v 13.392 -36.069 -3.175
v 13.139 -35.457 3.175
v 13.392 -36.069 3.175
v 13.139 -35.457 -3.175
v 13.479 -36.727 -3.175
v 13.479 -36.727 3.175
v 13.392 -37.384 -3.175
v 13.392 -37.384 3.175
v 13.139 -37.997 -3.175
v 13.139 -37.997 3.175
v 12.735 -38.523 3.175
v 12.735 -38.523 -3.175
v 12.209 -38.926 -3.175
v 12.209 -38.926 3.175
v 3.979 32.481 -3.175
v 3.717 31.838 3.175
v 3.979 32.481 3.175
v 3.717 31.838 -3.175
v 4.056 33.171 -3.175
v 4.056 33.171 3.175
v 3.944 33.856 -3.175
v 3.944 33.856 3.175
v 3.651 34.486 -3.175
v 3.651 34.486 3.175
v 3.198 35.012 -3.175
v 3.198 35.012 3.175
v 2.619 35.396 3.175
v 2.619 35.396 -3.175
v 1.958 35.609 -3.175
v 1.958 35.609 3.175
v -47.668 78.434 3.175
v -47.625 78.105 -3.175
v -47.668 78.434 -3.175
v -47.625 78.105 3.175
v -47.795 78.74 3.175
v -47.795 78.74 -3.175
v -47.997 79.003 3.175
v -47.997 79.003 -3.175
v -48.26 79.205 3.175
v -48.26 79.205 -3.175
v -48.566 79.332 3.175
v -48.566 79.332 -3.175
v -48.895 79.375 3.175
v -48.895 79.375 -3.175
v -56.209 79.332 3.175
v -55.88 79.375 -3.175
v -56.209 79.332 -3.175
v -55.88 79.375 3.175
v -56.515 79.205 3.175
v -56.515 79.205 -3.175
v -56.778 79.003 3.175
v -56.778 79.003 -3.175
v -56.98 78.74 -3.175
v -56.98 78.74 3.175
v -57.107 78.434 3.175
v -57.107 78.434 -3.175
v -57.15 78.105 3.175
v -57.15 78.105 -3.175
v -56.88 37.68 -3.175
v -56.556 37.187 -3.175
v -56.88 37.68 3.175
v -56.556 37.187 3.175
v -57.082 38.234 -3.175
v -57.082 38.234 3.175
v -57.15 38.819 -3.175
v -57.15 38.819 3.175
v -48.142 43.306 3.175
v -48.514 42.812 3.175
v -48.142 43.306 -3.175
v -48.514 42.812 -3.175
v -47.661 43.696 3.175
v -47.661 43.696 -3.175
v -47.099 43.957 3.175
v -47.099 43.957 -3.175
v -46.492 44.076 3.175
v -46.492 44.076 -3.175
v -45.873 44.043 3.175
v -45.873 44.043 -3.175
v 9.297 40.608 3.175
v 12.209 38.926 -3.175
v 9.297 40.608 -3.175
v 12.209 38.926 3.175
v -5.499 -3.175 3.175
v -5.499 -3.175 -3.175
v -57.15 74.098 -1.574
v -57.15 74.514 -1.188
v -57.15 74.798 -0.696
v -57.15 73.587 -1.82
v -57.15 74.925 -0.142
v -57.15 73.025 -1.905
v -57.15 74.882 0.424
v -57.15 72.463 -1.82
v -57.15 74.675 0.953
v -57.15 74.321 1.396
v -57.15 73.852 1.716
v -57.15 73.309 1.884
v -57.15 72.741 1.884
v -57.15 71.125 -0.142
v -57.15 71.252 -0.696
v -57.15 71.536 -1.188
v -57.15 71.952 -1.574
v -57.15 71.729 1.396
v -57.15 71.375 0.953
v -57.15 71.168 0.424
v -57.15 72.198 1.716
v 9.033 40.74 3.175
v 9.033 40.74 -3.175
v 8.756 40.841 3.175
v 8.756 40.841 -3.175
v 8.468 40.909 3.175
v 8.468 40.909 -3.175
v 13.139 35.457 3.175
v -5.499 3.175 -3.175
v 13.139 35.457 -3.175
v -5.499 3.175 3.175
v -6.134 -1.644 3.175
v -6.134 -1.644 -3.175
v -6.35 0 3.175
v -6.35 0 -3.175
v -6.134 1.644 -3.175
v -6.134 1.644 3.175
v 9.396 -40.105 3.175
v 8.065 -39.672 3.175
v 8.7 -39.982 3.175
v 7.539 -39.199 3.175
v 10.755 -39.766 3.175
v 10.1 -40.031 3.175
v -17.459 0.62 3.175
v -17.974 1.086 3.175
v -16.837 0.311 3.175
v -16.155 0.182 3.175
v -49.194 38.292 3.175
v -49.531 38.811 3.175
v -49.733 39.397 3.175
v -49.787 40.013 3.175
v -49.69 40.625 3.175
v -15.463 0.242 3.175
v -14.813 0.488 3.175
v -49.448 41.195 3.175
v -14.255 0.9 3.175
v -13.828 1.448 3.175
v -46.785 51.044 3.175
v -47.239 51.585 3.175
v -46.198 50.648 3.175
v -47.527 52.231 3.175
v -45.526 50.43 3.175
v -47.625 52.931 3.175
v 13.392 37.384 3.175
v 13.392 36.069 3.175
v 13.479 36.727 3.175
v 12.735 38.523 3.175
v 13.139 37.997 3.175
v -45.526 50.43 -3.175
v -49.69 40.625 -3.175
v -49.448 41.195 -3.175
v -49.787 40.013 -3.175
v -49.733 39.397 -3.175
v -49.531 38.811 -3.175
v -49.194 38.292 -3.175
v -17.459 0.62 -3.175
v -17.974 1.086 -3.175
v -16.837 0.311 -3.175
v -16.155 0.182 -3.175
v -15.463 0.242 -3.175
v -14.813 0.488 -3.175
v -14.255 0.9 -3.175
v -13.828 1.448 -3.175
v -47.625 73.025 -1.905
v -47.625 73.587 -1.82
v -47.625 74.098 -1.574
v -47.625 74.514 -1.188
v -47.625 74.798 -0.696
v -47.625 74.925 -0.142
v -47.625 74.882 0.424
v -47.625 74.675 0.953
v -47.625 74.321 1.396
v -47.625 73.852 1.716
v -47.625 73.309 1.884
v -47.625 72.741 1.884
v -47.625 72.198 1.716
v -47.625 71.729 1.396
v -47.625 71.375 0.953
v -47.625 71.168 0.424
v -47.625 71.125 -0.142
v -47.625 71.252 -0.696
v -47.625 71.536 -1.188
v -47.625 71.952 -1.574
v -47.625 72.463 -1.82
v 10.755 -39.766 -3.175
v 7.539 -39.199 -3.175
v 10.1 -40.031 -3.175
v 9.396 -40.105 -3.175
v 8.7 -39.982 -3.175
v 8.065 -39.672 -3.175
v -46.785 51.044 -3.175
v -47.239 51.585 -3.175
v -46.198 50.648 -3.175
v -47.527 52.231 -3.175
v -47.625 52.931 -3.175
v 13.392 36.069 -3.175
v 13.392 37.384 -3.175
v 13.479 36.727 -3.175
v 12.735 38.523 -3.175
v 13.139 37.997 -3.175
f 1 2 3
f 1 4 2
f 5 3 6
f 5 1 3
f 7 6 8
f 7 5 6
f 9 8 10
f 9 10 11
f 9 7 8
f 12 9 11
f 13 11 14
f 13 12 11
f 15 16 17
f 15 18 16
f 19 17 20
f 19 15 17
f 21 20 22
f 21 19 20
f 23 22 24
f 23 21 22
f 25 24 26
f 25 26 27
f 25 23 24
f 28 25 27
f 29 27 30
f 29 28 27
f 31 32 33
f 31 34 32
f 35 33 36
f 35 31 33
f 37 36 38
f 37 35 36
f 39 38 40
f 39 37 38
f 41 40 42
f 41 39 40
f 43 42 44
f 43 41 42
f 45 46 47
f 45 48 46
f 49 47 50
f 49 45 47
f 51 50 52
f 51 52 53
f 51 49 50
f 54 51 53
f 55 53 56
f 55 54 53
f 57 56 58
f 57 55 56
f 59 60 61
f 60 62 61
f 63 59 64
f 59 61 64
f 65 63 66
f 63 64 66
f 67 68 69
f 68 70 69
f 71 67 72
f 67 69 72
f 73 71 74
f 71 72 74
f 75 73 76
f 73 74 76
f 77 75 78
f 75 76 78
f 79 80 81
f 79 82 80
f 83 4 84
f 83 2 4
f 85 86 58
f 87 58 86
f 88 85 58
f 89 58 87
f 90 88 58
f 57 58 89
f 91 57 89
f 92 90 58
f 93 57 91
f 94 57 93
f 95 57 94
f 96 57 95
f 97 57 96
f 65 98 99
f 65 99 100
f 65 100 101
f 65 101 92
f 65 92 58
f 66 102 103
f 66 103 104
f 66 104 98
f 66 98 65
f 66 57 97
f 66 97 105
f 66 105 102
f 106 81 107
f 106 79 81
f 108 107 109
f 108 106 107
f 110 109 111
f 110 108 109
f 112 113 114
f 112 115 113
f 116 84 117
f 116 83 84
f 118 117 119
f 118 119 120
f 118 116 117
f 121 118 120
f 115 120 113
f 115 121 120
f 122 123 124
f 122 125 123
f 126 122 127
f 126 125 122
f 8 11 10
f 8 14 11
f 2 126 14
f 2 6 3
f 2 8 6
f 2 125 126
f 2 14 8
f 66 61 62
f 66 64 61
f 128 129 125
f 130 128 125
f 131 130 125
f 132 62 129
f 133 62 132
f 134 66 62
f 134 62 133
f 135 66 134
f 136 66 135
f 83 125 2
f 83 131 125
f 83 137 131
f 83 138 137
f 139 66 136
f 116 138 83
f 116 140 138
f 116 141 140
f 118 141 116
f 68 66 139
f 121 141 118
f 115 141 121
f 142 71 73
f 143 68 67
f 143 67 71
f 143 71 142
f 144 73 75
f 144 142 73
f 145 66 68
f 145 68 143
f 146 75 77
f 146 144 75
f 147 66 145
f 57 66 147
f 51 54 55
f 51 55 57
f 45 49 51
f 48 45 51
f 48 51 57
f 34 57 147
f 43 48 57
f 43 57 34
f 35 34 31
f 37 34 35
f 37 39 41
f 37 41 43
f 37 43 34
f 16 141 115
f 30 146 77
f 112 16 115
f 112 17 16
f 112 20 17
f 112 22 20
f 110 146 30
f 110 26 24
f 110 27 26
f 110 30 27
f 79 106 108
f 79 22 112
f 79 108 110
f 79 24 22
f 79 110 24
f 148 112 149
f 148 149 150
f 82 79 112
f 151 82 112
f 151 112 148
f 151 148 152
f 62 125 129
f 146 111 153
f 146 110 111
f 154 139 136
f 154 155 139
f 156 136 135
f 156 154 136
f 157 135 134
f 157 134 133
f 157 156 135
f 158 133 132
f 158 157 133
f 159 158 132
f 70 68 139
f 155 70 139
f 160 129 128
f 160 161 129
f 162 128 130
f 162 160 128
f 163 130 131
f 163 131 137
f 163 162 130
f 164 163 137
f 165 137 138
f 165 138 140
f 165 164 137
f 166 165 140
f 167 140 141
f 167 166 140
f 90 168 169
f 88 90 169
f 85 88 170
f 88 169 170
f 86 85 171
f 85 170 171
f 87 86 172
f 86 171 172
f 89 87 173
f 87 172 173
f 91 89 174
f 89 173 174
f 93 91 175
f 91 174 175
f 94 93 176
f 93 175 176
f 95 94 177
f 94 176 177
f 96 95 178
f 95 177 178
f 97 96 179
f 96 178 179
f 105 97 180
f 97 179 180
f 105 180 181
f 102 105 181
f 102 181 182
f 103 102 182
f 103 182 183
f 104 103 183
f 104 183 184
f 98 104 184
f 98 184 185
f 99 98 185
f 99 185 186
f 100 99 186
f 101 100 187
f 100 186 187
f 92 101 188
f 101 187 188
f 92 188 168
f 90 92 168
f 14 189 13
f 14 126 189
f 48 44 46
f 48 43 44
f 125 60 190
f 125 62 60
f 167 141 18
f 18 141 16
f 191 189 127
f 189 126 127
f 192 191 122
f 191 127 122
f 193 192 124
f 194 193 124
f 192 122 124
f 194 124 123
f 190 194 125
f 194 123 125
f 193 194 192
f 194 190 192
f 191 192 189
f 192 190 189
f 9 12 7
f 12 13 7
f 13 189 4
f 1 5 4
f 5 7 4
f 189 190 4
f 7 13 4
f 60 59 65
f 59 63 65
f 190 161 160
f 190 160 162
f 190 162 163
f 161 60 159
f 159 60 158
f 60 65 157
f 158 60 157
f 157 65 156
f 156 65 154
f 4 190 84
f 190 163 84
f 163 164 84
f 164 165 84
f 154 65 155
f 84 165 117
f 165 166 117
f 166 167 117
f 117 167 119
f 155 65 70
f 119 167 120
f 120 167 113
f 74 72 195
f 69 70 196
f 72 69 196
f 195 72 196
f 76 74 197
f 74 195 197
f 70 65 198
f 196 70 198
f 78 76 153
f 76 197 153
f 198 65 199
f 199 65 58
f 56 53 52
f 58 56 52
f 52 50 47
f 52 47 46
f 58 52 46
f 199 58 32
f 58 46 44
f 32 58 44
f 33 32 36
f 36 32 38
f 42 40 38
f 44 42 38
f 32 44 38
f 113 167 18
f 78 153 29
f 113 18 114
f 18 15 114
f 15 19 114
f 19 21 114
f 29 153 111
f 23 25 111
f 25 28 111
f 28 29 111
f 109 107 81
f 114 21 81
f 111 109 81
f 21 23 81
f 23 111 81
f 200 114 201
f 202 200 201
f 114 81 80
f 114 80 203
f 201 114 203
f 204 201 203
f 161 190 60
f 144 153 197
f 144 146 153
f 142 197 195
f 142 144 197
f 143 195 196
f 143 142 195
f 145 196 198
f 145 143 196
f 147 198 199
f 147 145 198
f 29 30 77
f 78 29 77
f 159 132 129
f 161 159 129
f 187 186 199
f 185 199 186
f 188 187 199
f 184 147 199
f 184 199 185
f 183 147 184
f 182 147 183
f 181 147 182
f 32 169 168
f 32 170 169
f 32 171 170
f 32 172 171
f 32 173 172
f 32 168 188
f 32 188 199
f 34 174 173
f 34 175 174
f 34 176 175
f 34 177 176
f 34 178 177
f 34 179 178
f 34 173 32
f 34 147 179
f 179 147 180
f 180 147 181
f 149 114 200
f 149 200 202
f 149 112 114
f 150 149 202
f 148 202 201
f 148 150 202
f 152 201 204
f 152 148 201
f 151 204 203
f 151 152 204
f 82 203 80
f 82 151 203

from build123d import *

# Parameters (mm, degrees)
BOSS_EXTRUDE1_DEPTH = 3.175
SKETCH2_R           = 1.905
CUT_EXTRUDE1_DEPTH  = 9.525
CUT_EXTRUDE2_DEPTH  = 6.35
FILLET1_R           = 2.54
FILLET2_R           = 1.27


with BuildPart() as part:
    # Sketch1 → Boss-Extrude1 (new body, symmetric)
    with BuildSketch(Plane.XY):
        with BuildLine():
            Line((-5.499261314, 3.175), (14.408622788, 37.656466735))
            Line((14.408622788, 37.656466735), (8.909361473, 40.831466735))
            Line((8.909361473, 40.831466735), (-47.625, 50.8))
            Line((-47.625, 50.8), (-47.625, 79.375))
            Line((-47.625, 79.375), (-57.15, 79.375))
            Line((-57.15, 79.375), (-57.15, 37.895014625))
            Line((-57.15, 37.895014625), (8.909361473, -40.831466735))
            Line((8.909361473, -40.831466735), (14.408622788, -37.656466735))
            Line((14.408622788, -37.656466735), (-5.499261314, -3.175))
            ThreePointArc((-5.499261314, -3.175), (-6.35, 0), (-5.499261314, 3.175))
        make_face()
    extrude(amount=BOSS_EXTRUDE1_DEPTH, both=True)

    # Sketch2 → Cut-Extrude1 (cut)
    with BuildSketch(Plane(origin=(-47.625, 0, 0), x_dir=(0, 0, -1), z_dir=(1, 0, 0))):
        with Locations((0, 73.025)):
            Circle(SKETCH2_R)
    extrude(amount=-CUT_EXTRUDE1_DEPTH, mode=Mode.SUBTRACT)

    # Sketch3 → Cut-Extrude2 (cut)
    with BuildSketch(Plane.XY.offset(3.175)):
        Polygon((-47.625, 44.352041015), (-50.337094235, 39.654556005), (-15.642242309, -1.693158423), (5.530597046, 34.97927508), align=None)
    extrude(amount=-CUT_EXTRUDE2_DEPTH, mode=Mode.SUBTRACT)

    # Fillet1
    fillet1_edges = [part.edges().sort_by_distance(p)[0] for p in [
        (-47.625, 50.8, 0),
        (8.909361473, 40.831466735, 0),
        (14.408622788, 37.656466735, 0),
        (14.408622788, -37.656466735, 0),
        (8.909361473, -40.831466735, 0),
        (-57.15, 37.895014625, 0),
        (-47.625, 44.352041015, 0),
        (5.530597046, 34.97927508, 0),
        (-15.642242309, -1.693158423, 0),
        (-50.337094235, 39.654556005, 0),
    ]]
    fillet(fillet1_edges, radius=FILLET1_R)

    # Fillet2
    fillet2_edges = [part.edges().sort_by_distance(p)[0] for p in [
        (-57.15, 79.375, 0),
        (-47.625, 79.375, 0),
    ]]
    fillet(fillet2_edges, radius=FILLET2_R)


solid = part.part
